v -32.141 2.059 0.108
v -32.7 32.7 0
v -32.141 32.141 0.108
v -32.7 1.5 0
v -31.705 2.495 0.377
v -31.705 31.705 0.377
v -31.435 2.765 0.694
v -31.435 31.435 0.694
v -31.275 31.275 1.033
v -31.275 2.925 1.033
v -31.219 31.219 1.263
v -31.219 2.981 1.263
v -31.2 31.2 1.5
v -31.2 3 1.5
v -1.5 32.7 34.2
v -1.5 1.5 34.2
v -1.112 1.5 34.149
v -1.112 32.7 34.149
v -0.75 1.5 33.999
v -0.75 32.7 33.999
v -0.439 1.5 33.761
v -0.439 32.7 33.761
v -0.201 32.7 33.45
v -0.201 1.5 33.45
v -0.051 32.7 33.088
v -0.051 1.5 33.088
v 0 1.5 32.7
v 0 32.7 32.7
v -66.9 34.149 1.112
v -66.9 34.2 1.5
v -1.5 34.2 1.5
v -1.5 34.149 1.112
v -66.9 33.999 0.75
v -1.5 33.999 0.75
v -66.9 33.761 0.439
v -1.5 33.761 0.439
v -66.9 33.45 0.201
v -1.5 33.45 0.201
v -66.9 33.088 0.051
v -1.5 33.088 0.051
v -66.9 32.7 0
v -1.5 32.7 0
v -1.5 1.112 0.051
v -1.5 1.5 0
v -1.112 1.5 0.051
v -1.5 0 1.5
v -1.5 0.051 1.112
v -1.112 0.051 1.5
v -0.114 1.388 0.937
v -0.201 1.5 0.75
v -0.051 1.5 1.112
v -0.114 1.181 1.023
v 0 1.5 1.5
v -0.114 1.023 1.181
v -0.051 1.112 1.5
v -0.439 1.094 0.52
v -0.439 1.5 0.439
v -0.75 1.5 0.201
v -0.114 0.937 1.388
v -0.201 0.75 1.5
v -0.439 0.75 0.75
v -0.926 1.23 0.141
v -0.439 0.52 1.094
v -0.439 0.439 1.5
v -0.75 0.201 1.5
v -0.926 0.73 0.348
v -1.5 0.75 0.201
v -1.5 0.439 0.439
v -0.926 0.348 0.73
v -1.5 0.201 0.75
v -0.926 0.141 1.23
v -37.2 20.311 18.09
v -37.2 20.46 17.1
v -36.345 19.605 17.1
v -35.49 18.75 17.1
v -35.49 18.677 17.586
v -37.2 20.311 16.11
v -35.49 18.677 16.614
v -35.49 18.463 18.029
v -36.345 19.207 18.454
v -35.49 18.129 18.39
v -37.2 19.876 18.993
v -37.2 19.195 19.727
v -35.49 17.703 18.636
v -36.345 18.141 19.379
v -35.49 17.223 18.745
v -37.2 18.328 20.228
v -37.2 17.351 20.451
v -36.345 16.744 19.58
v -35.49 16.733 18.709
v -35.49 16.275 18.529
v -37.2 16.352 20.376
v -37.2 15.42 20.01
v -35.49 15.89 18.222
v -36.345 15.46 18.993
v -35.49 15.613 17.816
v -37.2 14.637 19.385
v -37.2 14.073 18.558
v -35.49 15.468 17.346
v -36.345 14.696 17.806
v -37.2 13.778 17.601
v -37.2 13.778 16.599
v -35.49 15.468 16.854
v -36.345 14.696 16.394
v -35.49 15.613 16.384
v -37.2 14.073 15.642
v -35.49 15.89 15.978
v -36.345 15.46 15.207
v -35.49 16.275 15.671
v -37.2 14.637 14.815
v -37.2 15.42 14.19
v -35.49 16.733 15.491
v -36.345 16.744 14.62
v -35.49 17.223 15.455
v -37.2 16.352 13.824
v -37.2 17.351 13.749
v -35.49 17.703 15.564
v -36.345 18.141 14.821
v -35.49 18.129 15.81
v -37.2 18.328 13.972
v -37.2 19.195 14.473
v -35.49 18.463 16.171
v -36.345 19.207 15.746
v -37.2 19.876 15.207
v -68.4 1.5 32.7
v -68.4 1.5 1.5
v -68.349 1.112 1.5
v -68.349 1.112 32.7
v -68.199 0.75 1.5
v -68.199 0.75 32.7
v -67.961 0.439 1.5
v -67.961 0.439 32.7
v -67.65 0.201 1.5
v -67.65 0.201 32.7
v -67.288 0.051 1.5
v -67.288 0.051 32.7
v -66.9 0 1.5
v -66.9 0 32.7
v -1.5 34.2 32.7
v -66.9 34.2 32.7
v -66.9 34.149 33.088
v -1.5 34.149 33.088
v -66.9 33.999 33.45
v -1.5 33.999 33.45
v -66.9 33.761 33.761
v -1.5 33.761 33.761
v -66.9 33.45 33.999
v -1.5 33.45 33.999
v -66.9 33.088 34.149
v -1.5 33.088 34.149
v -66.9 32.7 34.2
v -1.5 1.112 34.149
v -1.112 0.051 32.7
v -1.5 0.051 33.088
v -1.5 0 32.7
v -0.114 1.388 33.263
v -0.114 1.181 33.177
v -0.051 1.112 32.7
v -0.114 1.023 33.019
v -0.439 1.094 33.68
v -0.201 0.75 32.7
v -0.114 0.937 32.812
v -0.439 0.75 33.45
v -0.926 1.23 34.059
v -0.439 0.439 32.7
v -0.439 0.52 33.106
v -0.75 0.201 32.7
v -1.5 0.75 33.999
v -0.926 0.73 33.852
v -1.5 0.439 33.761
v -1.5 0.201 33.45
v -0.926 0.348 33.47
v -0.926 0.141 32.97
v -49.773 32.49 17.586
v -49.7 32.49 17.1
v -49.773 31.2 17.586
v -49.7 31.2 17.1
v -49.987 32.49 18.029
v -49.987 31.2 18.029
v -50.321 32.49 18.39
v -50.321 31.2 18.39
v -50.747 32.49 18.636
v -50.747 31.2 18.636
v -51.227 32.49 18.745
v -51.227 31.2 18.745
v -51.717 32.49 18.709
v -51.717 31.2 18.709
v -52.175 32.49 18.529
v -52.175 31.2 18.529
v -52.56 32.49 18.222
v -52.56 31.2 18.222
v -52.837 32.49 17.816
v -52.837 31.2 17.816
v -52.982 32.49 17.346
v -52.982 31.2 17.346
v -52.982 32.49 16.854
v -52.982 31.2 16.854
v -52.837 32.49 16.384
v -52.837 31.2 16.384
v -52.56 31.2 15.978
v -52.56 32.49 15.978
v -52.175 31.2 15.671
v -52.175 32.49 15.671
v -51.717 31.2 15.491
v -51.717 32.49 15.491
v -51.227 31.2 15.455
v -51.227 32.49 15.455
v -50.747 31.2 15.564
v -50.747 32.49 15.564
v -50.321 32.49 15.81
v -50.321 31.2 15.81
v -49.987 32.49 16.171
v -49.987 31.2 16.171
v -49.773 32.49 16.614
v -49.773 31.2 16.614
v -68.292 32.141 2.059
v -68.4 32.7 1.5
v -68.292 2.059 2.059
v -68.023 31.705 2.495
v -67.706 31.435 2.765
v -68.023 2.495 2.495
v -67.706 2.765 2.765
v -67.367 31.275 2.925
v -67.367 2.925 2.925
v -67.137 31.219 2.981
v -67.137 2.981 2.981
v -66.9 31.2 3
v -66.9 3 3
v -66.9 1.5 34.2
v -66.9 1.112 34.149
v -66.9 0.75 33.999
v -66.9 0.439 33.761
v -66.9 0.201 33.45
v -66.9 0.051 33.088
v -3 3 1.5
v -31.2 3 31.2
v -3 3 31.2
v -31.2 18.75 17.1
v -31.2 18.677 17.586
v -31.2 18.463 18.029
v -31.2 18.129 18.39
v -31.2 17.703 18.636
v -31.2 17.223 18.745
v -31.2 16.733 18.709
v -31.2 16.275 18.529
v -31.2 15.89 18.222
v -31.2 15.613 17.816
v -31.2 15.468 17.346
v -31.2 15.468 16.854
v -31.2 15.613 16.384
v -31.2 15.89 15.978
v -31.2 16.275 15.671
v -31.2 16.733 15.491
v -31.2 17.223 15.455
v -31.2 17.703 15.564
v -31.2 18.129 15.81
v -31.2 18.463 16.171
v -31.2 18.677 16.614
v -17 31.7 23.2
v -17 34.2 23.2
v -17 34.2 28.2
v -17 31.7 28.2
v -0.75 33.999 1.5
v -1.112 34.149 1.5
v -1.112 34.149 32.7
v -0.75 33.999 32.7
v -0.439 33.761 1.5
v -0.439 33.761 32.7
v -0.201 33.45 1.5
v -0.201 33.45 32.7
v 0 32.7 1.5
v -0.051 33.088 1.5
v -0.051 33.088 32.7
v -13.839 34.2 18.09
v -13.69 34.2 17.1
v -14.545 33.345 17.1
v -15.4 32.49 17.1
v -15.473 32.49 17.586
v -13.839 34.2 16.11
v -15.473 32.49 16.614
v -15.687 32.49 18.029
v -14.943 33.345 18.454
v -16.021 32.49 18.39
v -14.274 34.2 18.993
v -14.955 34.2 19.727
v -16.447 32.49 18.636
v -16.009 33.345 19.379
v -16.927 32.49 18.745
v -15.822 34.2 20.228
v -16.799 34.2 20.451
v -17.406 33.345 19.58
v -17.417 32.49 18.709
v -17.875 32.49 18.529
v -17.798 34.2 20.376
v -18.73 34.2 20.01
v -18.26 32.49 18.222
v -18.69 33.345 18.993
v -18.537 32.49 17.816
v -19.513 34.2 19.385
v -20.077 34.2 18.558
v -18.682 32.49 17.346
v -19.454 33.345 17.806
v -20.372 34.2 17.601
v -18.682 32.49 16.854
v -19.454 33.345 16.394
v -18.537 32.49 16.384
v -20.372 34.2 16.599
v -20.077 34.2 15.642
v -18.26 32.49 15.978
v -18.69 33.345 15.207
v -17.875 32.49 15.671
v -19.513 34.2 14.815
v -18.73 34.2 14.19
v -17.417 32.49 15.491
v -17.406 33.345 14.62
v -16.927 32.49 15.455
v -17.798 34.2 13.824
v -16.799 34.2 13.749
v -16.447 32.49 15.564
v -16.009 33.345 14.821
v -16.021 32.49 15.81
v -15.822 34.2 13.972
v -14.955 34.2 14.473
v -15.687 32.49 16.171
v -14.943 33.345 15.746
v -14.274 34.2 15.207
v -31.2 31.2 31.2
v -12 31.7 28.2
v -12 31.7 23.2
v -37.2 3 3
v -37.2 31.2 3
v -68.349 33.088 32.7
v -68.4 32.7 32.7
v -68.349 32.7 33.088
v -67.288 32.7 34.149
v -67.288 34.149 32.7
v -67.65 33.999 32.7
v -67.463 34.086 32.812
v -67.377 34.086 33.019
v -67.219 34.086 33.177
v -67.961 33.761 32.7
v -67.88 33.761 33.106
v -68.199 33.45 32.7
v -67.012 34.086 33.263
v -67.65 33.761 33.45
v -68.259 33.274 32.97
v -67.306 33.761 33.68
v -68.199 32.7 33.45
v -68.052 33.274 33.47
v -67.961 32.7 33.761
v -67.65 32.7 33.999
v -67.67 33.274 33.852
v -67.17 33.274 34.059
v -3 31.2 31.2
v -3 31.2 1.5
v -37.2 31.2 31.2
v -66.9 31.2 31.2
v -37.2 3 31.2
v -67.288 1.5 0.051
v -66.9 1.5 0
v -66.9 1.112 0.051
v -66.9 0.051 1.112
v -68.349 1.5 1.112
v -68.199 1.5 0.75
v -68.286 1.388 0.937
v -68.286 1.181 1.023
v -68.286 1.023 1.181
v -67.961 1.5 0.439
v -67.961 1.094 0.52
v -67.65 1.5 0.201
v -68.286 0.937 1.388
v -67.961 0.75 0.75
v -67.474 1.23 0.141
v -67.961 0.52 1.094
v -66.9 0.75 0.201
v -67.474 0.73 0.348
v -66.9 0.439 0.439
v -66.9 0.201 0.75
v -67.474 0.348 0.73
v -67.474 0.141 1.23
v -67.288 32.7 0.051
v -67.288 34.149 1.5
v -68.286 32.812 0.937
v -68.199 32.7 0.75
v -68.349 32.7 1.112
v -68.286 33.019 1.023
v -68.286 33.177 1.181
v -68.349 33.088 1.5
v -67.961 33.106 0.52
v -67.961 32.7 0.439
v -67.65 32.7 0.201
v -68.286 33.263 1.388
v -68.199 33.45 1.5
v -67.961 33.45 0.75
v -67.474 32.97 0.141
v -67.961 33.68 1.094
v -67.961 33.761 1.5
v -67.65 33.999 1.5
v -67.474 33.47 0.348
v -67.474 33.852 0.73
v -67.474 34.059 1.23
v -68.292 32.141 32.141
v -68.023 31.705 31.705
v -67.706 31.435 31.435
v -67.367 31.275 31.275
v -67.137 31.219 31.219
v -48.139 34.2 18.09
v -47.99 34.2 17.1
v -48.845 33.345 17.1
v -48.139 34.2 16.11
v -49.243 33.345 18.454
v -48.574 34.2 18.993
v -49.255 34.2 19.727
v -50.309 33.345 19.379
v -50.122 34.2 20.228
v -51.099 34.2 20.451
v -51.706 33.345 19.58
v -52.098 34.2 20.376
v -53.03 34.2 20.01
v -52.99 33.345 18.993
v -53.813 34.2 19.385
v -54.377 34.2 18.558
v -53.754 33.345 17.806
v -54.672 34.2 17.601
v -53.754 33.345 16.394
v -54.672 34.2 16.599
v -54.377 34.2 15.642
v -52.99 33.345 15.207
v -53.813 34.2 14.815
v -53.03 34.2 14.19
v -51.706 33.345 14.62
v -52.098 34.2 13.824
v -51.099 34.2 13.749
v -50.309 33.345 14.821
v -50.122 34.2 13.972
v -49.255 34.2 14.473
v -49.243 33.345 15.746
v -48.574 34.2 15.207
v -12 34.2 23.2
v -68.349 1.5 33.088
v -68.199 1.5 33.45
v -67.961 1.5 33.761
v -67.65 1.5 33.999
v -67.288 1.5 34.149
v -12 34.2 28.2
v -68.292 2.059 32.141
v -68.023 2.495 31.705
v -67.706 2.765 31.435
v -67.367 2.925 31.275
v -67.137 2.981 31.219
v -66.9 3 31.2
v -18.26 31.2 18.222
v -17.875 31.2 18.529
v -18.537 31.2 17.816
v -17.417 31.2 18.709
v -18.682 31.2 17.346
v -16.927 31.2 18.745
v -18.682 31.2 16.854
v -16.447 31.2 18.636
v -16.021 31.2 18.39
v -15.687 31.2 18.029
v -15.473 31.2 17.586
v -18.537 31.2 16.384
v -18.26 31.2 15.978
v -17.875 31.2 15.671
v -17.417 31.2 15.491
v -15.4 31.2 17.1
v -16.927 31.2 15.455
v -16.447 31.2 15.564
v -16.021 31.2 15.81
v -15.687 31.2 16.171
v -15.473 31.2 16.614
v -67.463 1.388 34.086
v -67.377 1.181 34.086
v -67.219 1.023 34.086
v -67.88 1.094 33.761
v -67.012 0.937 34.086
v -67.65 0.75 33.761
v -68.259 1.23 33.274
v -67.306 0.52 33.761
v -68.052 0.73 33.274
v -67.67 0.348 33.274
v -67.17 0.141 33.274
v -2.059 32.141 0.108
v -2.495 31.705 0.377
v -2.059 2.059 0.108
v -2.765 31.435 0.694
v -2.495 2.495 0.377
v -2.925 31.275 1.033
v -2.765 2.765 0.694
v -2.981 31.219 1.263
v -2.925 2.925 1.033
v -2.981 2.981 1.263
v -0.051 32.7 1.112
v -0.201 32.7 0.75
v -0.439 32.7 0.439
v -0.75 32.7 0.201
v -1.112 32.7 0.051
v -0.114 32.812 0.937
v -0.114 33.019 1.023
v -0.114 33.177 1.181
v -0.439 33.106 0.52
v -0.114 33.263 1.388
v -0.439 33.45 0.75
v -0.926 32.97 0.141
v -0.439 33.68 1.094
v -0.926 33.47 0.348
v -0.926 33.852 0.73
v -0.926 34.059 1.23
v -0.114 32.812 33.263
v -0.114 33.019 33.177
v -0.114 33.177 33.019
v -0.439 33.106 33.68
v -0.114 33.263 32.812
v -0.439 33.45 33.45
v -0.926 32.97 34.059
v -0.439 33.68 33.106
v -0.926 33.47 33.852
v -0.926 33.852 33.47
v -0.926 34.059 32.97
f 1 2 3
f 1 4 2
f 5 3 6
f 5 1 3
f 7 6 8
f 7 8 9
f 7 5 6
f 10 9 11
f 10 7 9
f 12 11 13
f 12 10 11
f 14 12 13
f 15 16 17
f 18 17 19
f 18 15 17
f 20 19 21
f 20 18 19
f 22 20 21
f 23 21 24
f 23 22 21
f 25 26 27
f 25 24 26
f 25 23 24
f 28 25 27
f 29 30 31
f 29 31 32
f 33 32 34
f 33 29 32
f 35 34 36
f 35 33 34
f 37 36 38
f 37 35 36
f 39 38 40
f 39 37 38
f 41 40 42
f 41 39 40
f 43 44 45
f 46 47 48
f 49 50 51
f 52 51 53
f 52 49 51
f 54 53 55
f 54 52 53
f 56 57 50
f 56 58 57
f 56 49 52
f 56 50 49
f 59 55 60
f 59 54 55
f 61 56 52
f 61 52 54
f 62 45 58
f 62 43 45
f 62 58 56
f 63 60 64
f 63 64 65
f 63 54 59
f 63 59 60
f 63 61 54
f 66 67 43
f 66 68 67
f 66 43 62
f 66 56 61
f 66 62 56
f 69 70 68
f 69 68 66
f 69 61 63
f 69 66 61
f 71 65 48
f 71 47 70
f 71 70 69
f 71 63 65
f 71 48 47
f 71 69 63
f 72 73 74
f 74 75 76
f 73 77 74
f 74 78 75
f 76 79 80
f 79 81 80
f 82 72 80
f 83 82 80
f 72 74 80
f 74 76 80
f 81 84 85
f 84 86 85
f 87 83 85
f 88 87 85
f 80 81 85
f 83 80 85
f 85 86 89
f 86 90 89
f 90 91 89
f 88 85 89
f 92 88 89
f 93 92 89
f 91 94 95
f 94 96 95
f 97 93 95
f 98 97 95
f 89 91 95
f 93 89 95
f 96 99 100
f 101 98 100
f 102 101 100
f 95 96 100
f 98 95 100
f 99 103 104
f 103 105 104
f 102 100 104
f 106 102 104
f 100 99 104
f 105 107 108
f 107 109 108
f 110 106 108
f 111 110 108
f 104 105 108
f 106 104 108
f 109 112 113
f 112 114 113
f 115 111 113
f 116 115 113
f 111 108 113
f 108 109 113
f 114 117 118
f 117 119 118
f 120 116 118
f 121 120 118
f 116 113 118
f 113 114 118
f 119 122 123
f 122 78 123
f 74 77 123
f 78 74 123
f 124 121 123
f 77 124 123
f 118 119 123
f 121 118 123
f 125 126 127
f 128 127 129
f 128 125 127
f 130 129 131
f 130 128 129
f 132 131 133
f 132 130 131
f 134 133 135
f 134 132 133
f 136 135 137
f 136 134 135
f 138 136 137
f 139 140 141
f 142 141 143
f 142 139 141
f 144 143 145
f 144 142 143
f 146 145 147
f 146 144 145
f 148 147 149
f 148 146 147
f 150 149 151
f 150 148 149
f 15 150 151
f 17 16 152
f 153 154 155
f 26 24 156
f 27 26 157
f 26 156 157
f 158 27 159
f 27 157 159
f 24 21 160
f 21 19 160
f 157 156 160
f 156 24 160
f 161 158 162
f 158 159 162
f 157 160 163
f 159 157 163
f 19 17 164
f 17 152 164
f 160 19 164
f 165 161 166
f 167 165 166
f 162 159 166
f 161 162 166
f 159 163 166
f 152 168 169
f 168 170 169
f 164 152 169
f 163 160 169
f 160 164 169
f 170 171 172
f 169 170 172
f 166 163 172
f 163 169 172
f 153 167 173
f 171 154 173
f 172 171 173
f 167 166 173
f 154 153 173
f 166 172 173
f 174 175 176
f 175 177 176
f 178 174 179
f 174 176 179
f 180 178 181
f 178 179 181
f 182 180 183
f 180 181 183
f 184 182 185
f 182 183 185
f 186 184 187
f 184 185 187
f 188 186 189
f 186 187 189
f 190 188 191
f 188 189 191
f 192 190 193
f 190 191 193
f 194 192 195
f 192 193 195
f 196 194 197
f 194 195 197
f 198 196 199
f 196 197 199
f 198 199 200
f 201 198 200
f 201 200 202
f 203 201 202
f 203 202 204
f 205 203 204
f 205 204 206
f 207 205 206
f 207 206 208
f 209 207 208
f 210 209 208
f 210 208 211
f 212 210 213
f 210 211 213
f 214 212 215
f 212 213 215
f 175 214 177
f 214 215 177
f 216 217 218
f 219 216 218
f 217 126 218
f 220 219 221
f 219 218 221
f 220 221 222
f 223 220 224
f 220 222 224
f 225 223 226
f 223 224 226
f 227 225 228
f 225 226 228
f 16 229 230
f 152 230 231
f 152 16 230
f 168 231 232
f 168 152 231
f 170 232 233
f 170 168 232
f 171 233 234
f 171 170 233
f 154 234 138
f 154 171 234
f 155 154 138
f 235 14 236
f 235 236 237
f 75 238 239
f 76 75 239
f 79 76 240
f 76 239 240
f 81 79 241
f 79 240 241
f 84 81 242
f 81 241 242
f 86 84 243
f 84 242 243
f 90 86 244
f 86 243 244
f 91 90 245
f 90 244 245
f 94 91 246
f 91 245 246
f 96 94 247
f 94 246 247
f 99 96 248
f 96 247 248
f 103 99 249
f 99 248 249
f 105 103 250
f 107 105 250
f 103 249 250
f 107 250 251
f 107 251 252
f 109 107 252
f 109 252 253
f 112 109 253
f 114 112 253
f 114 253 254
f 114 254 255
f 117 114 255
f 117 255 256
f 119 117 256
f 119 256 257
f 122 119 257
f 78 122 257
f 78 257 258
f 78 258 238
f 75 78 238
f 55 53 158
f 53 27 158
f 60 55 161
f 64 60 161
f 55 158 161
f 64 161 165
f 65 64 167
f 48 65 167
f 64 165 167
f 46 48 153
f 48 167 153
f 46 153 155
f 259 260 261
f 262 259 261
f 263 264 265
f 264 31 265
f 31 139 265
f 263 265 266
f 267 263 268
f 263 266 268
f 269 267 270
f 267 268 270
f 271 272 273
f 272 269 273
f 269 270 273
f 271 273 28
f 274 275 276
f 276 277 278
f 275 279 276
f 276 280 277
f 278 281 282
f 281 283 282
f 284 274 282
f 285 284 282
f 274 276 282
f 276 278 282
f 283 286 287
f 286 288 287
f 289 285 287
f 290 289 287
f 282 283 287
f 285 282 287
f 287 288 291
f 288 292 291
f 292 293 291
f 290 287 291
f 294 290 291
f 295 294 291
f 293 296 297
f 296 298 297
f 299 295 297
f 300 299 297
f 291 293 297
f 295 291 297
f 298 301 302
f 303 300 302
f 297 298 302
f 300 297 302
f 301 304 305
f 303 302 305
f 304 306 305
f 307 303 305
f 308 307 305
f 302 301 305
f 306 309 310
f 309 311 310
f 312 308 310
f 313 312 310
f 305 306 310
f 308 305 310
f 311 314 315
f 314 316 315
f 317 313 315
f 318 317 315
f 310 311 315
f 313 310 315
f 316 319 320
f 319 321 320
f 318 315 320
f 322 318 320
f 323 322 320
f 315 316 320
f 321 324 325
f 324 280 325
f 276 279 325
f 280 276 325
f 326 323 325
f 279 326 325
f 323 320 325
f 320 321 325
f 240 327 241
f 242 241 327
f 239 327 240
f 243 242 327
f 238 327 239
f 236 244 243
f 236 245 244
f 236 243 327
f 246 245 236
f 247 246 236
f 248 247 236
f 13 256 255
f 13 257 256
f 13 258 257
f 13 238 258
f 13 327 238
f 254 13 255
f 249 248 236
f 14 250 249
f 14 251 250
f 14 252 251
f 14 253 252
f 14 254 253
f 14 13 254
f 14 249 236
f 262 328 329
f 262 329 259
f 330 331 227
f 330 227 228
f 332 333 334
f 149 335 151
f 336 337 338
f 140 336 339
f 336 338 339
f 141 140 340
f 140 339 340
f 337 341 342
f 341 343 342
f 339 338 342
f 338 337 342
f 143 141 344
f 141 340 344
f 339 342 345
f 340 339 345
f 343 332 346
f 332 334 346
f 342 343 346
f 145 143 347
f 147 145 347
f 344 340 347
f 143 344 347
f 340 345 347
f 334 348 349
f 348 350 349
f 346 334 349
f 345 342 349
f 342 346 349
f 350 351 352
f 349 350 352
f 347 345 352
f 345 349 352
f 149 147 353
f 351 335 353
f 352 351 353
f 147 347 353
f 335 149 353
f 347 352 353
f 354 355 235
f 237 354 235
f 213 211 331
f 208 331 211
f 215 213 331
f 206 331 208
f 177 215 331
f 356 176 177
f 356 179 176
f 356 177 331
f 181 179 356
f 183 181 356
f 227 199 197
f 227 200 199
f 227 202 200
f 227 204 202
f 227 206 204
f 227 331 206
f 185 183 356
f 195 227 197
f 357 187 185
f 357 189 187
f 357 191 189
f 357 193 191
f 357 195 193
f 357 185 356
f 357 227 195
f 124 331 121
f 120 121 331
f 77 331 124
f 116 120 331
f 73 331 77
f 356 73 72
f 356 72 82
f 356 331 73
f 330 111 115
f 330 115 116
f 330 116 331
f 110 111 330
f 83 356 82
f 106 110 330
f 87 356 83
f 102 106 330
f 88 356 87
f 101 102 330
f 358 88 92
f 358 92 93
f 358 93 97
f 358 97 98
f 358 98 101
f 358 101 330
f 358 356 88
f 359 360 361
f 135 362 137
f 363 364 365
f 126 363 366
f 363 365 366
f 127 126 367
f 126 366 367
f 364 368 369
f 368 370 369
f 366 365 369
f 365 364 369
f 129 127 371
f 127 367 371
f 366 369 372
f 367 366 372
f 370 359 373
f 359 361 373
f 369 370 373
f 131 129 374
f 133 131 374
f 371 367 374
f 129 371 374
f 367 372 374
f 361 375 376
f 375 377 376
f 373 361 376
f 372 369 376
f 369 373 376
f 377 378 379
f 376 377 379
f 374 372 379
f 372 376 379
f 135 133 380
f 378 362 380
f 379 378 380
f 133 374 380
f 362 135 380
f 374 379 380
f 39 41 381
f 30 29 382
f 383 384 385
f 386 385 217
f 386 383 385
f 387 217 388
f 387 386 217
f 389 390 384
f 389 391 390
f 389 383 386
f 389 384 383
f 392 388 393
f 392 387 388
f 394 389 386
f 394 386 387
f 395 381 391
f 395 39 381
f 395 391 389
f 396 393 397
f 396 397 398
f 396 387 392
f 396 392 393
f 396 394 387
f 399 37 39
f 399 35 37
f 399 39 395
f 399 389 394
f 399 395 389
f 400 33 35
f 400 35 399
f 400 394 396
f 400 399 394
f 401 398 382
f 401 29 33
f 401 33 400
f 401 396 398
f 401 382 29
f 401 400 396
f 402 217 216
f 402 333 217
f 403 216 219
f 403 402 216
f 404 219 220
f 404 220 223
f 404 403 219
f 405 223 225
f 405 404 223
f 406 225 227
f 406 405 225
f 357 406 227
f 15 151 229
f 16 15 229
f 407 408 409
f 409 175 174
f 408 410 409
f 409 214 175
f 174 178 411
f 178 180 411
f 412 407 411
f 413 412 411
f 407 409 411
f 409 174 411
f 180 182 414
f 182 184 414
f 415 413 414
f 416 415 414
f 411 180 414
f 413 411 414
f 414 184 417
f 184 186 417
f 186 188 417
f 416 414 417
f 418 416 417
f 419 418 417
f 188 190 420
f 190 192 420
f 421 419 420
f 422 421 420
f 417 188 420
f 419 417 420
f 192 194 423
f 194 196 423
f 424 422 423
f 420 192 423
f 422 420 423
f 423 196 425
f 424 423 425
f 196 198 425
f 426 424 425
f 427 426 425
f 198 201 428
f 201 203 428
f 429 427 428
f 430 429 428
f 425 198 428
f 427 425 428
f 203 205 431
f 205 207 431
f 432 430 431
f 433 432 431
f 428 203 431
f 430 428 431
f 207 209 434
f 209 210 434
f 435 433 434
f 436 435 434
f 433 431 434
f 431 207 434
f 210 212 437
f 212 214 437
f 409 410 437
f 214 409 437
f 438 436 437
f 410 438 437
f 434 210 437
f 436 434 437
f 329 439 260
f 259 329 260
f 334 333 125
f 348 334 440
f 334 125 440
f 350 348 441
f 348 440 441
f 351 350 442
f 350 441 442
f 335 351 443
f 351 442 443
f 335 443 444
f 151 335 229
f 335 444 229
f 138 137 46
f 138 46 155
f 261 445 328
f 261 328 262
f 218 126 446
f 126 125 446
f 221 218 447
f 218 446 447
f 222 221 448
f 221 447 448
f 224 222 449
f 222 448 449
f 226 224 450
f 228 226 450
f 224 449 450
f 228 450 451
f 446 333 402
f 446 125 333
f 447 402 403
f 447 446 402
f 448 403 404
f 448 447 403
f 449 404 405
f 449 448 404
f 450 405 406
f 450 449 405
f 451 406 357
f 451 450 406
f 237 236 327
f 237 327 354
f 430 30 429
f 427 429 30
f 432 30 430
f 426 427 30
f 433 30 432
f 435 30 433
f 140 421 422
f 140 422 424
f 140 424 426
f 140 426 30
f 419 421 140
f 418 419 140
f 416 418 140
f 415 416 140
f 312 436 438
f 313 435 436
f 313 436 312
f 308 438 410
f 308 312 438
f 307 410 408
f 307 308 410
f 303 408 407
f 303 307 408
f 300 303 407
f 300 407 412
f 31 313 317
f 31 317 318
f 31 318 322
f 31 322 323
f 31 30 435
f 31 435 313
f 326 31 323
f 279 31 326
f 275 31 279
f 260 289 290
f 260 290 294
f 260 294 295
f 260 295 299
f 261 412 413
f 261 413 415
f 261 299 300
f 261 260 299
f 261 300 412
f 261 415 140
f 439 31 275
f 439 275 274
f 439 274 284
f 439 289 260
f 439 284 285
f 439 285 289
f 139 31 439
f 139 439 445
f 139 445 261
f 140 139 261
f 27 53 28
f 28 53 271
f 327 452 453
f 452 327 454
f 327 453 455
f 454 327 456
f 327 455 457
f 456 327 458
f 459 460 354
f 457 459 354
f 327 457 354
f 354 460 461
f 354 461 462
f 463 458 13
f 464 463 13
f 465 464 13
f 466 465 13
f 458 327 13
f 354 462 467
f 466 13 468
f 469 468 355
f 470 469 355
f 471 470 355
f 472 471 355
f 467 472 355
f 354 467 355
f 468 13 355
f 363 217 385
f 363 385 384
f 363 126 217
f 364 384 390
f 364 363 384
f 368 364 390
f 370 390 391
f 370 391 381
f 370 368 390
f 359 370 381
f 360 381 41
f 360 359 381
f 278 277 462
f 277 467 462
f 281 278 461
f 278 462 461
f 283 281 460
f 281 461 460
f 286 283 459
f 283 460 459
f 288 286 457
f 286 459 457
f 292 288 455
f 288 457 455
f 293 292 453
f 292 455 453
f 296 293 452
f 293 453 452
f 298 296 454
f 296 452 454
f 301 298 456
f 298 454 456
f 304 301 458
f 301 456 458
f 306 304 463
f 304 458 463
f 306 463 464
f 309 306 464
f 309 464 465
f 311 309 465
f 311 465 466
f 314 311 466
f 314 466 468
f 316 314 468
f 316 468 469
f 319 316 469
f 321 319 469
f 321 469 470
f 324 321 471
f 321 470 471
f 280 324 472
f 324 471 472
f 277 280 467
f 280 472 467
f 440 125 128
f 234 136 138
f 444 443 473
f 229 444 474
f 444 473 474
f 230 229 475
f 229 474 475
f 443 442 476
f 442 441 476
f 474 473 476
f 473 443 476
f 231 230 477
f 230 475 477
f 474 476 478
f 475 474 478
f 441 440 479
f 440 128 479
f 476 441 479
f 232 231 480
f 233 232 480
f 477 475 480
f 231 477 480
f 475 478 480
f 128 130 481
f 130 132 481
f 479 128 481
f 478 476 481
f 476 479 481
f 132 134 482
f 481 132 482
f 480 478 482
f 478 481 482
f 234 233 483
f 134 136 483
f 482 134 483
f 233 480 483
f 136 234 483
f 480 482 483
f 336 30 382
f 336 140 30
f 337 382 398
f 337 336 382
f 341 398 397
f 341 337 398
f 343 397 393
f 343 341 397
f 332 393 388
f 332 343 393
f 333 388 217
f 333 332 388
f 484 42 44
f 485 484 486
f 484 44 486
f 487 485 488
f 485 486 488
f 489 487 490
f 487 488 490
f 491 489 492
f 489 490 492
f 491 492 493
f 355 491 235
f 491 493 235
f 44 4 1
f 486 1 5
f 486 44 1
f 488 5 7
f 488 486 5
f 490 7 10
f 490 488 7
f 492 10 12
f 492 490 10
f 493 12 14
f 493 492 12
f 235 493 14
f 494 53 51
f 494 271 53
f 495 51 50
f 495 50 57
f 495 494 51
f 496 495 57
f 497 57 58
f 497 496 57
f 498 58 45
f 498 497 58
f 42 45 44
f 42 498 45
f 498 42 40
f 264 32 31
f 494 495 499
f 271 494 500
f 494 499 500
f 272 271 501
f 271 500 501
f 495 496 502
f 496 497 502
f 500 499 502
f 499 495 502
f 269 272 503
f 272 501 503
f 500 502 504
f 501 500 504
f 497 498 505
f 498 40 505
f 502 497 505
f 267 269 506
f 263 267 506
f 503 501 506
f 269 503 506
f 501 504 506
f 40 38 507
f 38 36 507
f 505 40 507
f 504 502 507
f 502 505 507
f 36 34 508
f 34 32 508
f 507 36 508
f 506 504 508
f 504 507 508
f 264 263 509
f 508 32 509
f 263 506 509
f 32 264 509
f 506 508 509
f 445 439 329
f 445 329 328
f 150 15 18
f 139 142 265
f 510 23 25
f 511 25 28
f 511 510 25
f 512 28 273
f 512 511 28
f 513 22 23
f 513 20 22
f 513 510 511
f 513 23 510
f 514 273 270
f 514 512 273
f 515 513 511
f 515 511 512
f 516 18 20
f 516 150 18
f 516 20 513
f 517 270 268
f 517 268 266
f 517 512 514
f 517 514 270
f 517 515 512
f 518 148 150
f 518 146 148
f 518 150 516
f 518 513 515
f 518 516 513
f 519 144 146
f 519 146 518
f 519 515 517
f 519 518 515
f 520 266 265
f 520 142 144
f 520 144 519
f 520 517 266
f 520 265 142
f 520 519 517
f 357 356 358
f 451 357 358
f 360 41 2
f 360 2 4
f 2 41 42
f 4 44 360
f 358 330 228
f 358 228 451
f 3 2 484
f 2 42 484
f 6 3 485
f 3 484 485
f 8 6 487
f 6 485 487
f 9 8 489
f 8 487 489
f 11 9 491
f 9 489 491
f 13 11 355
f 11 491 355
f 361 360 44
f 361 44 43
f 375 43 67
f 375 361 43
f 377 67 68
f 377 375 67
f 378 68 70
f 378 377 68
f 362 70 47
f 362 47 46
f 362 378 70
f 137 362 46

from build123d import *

# Parameters (mm, degrees)
F1_DEPTH             = 34.2
F2_W                 = 34.2
F2_H                 = 34.2
F3_DEPTH             = 34.2
F4_W                 = 28.2
F4_H                 = 28.2
F5_DEPTH             = 31.2
F8_D                 = 3.3
F8_DEPTH             = 25
F8_CSINK_D           = 6.72
F8_CSINK_ANGLE       = 90
F8_TIP               = 0.9914200214
F8_ON_F7_D           = 3.3
F8_ON_F7_DEPTH       = 25
F8_ON_F7_CSINK_D     = 6.72
F8_ON_F7_CSINK_ANGLE = 90
F8_ON_F7_TIP         = 0.9914200214
F9_W                 = 28.2
F9_H                 = 28.2
F10_DEPTH            = 31.2
F11_R                = 1.49999
F12_W                = 5
F12_H                = 5
F13_DEPTH            = 2.5


# Not quite as in the source:
# - a fillet or chamfer is up to 0.001 mm smaller than in the source, because OpenCascade refuses the exact size
# - a feature names something its author has since deleted; it is built from what else it names


with BuildPart() as f1:
    # F0 (on Top) → F1 (new body)
    with BuildSketch(Plane.XY):
        Polygon((-34.2, 0), (-8, 0), (0, 0), (0, 34.2), (-34.2, 34.2), align=None)
    extrude(amount=F1_DEPTH)

    # F2 (on face) → F3 (join)
    with BuildSketch(Plane(origin=(-34.2, 0, 0), x_dir=(0, -1, 0), z_dir=(-1, 0, 0))):
        with Locations((-17.1, 17.1)):
            Rectangle(F2_W, F2_H)
    extrude(amount=F3_DEPTH)

    # F4 (on face) → F5 (cut)
    with BuildSketch(Plane(origin=(-68.4, 0, 0), x_dir=(0, -1, 0), z_dir=(-1, 0, 0))):
        with Locations((-17.1, 17.1)):
            Rectangle(F4_W, F4_H)
    extrude(amount=-F5_DEPTH, mode=Mode.SUBTRACT)

    # F8
    with Locations(Plane(origin=(0, 34.2, 0), x_dir=(-1, 0, 0), z_dir=(0, 1, 0))):
        with Locations((17.05, 17.1), (51.35, 17.1)):
            CounterSinkHole(F8_D / 2, F8_CSINK_D / 2, depth=F8_DEPTH, counter_sink_angle=F8_CSINK_ANGLE)
            with Locations((0, 0, -(F8_DEPTH + F8_TIP / 2))):  # 118° drill point
                Cone(0, F8_D / 2, F8_TIP, mode=Mode.SUBTRACT)

    # F8 on F7
    with Locations(Plane(origin=(-37.2, 0, 0), x_dir=(0, -1, 0), z_dir=(-1, 0, 0))):
        with Locations((-17.1, 17.1)):
            CounterSinkHole(F8_ON_F7_D / 2, F8_ON_F7_CSINK_D / 2, depth=F8_ON_F7_DEPTH, counter_sink_angle=F8_ON_F7_CSINK_ANGLE)
            with Locations((0, 0, -(F8_ON_F7_DEPTH + F8_ON_F7_TIP / 2))):  # 118° drill point
                Cone(0, F8_ON_F7_D / 2, F8_ON_F7_TIP, mode=Mode.SUBTRACT)

    # F9 (on face) → F10 (cut)
    with BuildSketch(Plane(origin=(0, 0, 0), x_dir=(1, 0, 0), z_dir=(0, 0, -1))):
        with Locations((-17.1, -17.1)):
            Rectangle(F9_W, F9_H)
    extrude(amount=-F10_DEPTH, mode=Mode.SUBTRACT)

    # F11 (radius 1.5 in the source; OpenCascade refuses exactly that, so slightly less here)
    f11_edges = [f1.edges().sort_by_distance(p)[0] for p in [
        (-31.2, 17.1, 0),
        (-17.1, 3, 0),
        (-3, 17.1, 0),
        (-17.1, 31.2, 0),
        (-34.2, 34.2, 0),
        (-34.2, 0, 0),
        (0, 17.1, 0),
        (-68.4, 17.1, 0),
        (-68.4, 0, 17.1),
        (-68.4, 17.1, 34.2),
        (-68.4, 34.2, 17.1),
        (-68.4, 17.1, 31.2),
        (-68.4, 3, 17.1),
        (-68.4, 17.1, 3),
        (-68.4, 31.2, 17.1),
        (-34.2, 0, 34.2),
        (-34.2, 34.2, 34.2),
        (0, 17.1, 34.2),
        (0, 34.2, 17.1),
        (0, 0, 17.1),
    ]]
    fillet(f11_edges, radius=F11_R)

    # F12 (on face) → F13 (cut)
    with BuildSketch(Plane(origin=(0, 34.2, 0), x_dir=(-1, 0, 0), z_dir=(0, 1, 0))):
        with Locations((14.5, 25.7)):
            Rectangle(F12_W, F12_H)
    extrude(amount=-F13_DEPTH, mode=Mode.SUBTRACT)


solid = f1.part
